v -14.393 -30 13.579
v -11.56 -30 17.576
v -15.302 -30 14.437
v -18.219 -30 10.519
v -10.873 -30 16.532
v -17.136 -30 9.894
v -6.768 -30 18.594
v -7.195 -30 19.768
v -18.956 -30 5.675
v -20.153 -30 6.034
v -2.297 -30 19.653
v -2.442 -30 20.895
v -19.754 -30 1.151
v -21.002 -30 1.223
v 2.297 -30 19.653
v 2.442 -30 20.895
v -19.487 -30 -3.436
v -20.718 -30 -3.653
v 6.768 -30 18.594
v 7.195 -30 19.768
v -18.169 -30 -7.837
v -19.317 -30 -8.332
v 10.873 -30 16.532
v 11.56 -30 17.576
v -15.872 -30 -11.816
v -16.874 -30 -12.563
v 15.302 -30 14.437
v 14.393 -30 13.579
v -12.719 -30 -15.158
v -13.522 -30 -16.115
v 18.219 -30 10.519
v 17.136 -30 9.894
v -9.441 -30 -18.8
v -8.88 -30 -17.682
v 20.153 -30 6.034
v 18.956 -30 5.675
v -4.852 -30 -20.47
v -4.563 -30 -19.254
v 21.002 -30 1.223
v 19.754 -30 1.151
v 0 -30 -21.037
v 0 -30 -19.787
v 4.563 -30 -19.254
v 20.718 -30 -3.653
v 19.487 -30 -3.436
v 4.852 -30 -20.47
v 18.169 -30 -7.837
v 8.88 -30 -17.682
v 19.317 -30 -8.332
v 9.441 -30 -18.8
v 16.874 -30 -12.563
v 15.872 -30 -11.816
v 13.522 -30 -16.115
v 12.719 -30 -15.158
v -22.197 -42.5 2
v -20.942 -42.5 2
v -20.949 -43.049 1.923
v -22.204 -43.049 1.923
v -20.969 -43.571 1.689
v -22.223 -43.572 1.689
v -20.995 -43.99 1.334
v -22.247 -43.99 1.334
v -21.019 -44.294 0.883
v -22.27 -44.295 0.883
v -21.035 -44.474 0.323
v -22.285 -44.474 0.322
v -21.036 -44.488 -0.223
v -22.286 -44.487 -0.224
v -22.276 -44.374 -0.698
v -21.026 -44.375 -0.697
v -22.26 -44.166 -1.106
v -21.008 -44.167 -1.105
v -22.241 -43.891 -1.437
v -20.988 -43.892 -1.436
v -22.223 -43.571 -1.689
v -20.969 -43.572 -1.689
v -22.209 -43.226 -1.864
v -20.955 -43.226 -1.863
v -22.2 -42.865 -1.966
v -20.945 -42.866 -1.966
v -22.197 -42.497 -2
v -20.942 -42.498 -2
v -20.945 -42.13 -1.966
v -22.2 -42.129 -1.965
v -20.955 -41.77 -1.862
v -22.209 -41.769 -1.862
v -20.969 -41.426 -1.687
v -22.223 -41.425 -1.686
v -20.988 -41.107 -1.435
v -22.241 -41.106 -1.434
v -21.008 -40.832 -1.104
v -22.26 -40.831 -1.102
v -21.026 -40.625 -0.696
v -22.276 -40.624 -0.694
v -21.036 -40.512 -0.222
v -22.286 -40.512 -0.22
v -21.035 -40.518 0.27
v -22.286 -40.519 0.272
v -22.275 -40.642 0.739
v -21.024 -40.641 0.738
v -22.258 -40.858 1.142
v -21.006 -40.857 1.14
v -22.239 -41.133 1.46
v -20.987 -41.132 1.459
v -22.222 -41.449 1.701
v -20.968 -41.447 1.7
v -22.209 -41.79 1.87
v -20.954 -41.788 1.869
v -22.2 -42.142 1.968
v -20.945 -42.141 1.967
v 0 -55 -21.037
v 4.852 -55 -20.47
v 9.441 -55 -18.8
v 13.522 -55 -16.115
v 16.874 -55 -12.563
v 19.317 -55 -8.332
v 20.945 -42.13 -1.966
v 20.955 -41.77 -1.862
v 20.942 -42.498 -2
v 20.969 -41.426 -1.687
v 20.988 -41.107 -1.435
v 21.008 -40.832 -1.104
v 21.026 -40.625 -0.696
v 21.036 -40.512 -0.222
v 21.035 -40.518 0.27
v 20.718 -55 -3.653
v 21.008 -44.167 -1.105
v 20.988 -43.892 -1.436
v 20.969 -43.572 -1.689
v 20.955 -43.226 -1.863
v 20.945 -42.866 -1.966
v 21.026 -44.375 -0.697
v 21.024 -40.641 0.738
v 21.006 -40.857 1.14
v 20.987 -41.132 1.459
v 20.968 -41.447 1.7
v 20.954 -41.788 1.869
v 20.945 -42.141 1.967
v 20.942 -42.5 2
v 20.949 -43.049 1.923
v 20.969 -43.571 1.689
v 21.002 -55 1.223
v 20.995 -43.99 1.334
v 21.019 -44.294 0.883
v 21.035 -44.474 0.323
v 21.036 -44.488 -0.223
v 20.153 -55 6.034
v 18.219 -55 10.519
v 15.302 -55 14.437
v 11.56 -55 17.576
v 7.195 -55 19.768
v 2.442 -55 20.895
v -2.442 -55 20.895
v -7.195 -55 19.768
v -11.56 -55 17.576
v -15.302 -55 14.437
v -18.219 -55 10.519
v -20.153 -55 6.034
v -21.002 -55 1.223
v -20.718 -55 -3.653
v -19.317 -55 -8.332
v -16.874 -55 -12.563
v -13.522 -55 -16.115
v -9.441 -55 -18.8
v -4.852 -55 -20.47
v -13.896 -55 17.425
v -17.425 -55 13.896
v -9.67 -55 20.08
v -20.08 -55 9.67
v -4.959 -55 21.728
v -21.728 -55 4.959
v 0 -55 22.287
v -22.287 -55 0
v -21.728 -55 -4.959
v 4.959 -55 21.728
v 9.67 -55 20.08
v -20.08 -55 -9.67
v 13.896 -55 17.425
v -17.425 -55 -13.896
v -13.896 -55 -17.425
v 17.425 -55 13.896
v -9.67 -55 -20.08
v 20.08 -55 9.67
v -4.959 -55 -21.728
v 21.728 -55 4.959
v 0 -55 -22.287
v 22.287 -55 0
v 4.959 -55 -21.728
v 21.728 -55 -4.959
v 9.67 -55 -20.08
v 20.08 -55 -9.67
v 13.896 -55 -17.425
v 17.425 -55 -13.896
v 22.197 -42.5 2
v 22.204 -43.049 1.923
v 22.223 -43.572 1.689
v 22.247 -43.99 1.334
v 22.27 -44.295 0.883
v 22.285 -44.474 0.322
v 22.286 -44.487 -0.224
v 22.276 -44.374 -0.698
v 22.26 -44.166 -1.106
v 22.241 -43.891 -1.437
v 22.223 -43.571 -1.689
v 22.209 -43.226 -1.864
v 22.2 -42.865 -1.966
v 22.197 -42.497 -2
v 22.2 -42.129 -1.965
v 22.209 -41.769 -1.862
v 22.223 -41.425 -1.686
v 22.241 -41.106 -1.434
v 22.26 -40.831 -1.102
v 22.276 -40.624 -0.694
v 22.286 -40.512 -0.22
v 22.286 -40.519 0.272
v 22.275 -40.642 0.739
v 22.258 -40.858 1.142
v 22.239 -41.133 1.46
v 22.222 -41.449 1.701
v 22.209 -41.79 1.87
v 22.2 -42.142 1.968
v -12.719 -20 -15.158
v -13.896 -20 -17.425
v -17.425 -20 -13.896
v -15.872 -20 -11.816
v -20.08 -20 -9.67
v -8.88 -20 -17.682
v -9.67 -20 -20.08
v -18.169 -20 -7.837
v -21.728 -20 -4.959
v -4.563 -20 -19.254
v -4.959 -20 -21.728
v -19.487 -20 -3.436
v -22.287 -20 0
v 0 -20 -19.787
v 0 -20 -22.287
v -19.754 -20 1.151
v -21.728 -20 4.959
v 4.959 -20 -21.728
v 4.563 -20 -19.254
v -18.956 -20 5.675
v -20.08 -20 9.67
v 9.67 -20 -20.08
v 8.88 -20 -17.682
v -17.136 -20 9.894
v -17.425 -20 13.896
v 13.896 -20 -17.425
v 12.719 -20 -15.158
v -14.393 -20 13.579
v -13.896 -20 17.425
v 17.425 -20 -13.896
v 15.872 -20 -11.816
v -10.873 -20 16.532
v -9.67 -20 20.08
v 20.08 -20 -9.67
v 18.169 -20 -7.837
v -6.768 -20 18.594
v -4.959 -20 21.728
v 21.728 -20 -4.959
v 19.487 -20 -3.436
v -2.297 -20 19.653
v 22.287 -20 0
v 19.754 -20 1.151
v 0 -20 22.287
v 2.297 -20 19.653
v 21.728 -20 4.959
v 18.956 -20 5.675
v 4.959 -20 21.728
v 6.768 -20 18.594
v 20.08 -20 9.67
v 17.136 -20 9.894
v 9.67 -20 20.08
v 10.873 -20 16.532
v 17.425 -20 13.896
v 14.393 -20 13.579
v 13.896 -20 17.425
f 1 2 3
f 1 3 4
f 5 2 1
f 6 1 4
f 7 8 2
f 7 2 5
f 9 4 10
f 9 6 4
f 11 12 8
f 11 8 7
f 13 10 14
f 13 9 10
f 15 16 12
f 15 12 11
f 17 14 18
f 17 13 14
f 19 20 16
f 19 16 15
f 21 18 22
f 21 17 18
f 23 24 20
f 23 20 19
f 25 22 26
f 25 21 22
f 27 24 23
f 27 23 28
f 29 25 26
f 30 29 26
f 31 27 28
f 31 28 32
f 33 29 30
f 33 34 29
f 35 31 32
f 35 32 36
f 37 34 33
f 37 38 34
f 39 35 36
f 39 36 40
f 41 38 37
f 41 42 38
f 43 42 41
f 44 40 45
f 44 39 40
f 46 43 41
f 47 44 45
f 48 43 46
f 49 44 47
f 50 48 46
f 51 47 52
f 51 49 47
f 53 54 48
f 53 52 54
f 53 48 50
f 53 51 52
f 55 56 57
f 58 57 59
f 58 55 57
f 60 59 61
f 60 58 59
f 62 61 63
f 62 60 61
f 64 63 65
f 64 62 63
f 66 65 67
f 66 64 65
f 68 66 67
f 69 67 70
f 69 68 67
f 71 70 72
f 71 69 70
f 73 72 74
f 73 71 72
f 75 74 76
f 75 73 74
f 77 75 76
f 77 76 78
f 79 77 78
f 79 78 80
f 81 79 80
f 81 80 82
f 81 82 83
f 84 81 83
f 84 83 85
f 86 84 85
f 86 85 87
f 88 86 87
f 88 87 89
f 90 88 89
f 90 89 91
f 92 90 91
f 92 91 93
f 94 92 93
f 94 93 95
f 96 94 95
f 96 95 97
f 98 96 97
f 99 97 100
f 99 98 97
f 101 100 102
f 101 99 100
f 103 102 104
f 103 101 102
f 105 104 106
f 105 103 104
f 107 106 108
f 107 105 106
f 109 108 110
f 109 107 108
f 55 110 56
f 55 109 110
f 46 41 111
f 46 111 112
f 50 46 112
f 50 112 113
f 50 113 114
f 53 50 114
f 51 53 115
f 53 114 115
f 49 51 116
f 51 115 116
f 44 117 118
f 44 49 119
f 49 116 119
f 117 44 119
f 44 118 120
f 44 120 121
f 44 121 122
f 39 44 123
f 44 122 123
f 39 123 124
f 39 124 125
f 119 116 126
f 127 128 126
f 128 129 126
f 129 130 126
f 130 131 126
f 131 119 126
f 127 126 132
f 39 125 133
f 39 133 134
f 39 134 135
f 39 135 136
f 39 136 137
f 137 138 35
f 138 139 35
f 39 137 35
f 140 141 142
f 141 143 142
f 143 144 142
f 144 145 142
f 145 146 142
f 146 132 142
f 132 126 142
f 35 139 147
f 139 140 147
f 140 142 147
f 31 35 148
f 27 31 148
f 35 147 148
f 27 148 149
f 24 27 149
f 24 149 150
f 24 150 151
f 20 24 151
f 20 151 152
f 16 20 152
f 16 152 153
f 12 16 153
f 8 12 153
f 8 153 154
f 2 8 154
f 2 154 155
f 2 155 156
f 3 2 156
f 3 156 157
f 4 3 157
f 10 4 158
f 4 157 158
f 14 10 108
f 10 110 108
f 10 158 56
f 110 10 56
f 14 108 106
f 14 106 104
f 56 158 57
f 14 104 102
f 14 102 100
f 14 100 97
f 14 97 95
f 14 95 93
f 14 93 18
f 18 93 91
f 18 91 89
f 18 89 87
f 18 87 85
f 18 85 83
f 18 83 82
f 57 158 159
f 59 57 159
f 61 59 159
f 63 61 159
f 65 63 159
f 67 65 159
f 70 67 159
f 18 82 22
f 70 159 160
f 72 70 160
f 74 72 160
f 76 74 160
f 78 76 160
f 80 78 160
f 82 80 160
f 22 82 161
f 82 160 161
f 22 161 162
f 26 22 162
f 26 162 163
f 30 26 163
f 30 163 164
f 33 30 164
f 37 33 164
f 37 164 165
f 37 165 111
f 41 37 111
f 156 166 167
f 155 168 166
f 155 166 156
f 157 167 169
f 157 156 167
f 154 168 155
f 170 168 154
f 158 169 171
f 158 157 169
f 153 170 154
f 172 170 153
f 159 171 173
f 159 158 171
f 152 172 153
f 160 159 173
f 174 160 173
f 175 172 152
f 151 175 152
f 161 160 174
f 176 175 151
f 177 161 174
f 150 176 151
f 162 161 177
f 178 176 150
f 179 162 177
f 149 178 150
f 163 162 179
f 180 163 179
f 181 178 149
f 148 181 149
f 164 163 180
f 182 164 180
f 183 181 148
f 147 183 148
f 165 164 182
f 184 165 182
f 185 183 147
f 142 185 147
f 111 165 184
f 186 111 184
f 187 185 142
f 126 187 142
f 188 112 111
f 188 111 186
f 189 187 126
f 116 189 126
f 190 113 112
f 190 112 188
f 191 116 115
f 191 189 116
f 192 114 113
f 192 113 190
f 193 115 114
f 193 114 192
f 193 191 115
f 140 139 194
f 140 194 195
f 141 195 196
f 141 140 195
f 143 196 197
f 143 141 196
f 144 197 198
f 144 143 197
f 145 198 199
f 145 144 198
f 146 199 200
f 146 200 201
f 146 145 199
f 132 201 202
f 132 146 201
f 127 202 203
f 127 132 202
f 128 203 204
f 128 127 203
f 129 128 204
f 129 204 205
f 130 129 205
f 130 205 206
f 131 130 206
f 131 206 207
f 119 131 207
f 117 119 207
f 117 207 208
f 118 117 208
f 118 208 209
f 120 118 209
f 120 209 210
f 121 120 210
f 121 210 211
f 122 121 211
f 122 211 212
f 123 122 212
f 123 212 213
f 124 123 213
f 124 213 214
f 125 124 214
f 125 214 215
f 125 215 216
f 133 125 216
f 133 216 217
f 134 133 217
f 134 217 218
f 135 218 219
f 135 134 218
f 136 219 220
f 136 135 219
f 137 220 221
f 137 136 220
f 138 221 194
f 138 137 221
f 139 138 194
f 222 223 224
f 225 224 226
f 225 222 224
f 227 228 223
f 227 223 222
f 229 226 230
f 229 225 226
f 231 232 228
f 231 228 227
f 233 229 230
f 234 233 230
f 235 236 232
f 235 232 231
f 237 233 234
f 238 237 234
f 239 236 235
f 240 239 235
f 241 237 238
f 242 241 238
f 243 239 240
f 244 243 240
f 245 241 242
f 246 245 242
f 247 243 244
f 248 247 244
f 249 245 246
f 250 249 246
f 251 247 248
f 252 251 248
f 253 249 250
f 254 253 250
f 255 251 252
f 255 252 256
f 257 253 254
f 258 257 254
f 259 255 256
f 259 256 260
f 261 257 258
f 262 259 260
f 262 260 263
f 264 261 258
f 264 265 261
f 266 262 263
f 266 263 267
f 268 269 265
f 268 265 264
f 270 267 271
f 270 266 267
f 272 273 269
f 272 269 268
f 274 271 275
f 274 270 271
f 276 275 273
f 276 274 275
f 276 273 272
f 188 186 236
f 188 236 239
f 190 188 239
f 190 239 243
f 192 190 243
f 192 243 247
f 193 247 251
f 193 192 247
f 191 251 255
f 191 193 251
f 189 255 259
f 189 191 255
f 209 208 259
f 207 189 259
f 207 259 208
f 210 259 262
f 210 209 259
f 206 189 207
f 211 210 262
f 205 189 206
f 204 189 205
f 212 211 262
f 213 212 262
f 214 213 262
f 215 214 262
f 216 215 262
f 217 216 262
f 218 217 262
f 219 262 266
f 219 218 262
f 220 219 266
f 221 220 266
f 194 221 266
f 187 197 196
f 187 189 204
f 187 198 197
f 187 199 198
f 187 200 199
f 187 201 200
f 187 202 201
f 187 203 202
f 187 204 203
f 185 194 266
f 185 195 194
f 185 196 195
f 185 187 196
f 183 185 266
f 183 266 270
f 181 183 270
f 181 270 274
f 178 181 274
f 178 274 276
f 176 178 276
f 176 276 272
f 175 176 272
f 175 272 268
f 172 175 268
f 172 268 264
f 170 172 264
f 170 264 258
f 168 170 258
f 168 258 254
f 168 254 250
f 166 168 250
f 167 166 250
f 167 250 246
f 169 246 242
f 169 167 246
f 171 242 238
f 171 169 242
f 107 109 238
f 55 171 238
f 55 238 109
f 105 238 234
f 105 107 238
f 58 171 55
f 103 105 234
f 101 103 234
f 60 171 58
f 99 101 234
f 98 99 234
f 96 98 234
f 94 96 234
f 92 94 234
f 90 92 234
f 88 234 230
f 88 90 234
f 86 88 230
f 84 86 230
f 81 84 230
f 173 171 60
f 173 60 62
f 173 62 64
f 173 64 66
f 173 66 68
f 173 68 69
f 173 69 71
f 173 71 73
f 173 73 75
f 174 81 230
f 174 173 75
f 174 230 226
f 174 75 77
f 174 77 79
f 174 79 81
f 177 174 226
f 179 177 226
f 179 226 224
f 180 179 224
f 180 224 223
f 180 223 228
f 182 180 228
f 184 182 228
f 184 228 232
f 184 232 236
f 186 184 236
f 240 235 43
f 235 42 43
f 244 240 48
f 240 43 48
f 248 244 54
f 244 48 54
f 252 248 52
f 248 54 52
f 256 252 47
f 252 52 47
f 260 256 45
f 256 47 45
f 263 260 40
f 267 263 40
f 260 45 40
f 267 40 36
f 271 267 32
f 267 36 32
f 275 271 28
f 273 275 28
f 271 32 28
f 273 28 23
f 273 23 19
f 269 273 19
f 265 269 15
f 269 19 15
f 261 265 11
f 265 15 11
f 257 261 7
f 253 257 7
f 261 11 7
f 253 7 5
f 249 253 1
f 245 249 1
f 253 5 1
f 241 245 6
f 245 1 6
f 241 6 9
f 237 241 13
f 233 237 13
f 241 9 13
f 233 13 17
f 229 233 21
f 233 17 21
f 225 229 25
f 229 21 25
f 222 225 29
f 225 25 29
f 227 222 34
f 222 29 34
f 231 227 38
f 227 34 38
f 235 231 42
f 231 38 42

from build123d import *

# Parameters (mm, degrees)
SKETCH1_R                = 34
BOSS_EXTRUDE1_DEPTH      = 10
SKETCH2_R                = 19.7871926
SKETCH2_R_2              = 2
CUT_EXTRUDE1_DEPTH       = 10
SKETCH3_R                = 4.837531333
SKETCH4_W                = 4.837531333
SKETCH4_H                = 4.837531333
CUT_EXTRUDE3_DEPTH       = 38
CUT_EXTRUDE3_DEPTH_BACK  = 38
SKETCH5_W                = 72.361656805
SKETCH5_H                = 8.896778435
BOSS_EXTRUDE2_START      = 60
SKETCH6_R                = 22.2871926
SKETCH6_R_2              = 19.7871926
BOSS_EXTRUDE2_DEPTH      = 60
SKETCH7_R                = 21.0371926
SKETCH7_R_2              = 19.7871926
CUT_EXTRUDE4_DEPTH       = 25
CUT_EXTRUDE6_DEPTH       = 25
CUT_EXTRUDE6_DEPTH_BACK  = 25
SKETCH8_R                = 2
CUT_EXTRUDE7_DEPTH       = 43
CUT_EXTRUDE7_DEPTH_BACK  = 53
SKETCH9_W                = 69.351432881
SKETCH9_H                = 5.737807944
CUT_EXTRUDE8_START       = -25
SKETCH10_R               = 22.2871926
SKETCH10_R_2             = 21.0371926
CUT_EXTRUDE8_DEPTH       = 25
CUT_EXTRUDE9_DEPTH       = 30
CUT_EXTRUDE9_DEPTH_BACK  = 30
SKETCH11_R               = 2
CUT_EXTRUDE10_DEPTH      = 53
CUT_EXTRUDE10_DEPTH_BACK = 26
SKETCH12_W               = 42.0743852
SKETCH12_H               = 25


with BuildPart() as part:
    # Sketch1 → Boss-Extrude1 (new body)
    with BuildSketch(Plane(origin=(0, 0, 0), x_dir=(1, 0, 0), z_dir=(0, 1, 0))):
        Circle(SKETCH1_R)
    extrude(amount=BOSS_EXTRUDE1_DEPTH)

    # Sketch2 → Cut-Extrude1 (cut)
    with BuildSketch(Plane.XZ):
        Circle(SKETCH2_R)
        with Locations((-22.1, 12.5)):
            Circle(SKETCH2_R_2)
        with Locations((22.1, 12.5)):
            Circle(SKETCH2_R_2)
        with Locations((22.1, -12.5)):
            Circle(SKETCH2_R_2)
        with Locations((-22.1, -12.5)):
            Circle(SKETCH2_R_2)
    extrude(amount=-CUT_EXTRUDE1_DEPTH, mode=Mode.SUBTRACT)

    # Sketch3 → Cut-Revolve1 (revolve, cut)
    with BuildSketch(Plane(origin=(0, 0, 0), x_dir=(0, 0, -1), z_dir=(1, 0, 0))):
        with Locations((-34, 5)):
            Circle(SKETCH3_R)
    revolve(axis=Axis((0, 0, 0), (0, 1, 0)), mode=Mode.SUBTRACT)

    # Sketch4 → Cut-Revolve2 (revolve, cut)
    with BuildSketch(Plane(origin=(0, 0, 0), x_dir=(0, 0, -1), z_dir=(1, 0, 0))):
        with Locations((-31.581234333, 2.581234333)):
            Rectangle(SKETCH4_W, SKETCH4_H)
    revolve(axis=Axis((0, 0, 0), (0, 1, 0)), mode=Mode.SUBTRACT)

    # Sketch5 → Cut-Extrude3 (cut, two sides: drawn at the far end of the back side and taken through both)
    with BuildSketch(Plane(origin=(0, 0, 0), x_dir=(0, 0, -1), z_dir=(1, 0, 0)).offset(-CUT_EXTRUDE3_DEPTH_BACK)):
        with Locations((-0.901301775, 0.551610782)):
            Rectangle(SKETCH5_W, SKETCH5_H)
    extrude(amount=CUT_EXTRUDE3_DEPTH + CUT_EXTRUDE3_DEPTH_BACK, mode=Mode.SUBTRACT)

    # Sketch6 → Boss-Extrude2 (add)
    with BuildSketch(Plane.XZ.offset(-5).offset(BOSS_EXTRUDE2_START)):
        Circle(SKETCH6_R)
        Circle(SKETCH6_R_2, mode=Mode.SUBTRACT)
    extrude(amount=-BOSS_EXTRUDE2_DEPTH)

    # Sketch7 → Cut-Extrude4 (cut)
    with BuildSketch(Plane.XZ.offset(55)):
        Circle(SKETCH7_R)
        Circle(SKETCH7_R_2, mode=Mode.SUBTRACT)
    extrude(amount=-CUT_EXTRUDE4_DEPTH, mode=Mode.SUBTRACT)

    # Sketch8 → Cut-Extrude6 (cut, two sides: drawn at the far end of the back side and taken through both)
    with BuildSketch(Plane(origin=(0, 0, 0), x_dir=(0, 0, -1), z_dir=(1, 0, 0)).offset(-CUT_EXTRUDE6_DEPTH_BACK)):
        with Locations((0, -42.5)):
            Circle(SKETCH8_R)
    extrude(amount=CUT_EXTRUDE6_DEPTH + CUT_EXTRUDE6_DEPTH_BACK, mode=Mode.SUBTRACT)

    # Sketch9 → Cut-Extrude7 (cut, two sides: drawn at the far end of the back side and taken through both)
    with BuildSketch(Plane(origin=(0, 0, 0), x_dir=(0, 0, -1), z_dir=(1, 0, 0)).offset(-CUT_EXTRUDE7_DEPTH_BACK)):
        with Locations((0.165912519, 7.868903972)):
            Rectangle(SKETCH9_W, SKETCH9_H)
    extrude(amount=CUT_EXTRUDE7_DEPTH + CUT_EXTRUDE7_DEPTH_BACK, mode=Mode.SUBTRACT)

    # Sketch10 → Cut-Extrude8 (cut)
    with BuildSketch(Plane(origin=(0, 5, 0), x_dir=(1, 0, 0), z_dir=(0, 1, 0)).offset(CUT_EXTRUDE8_START)):
        Circle(SKETCH10_R)
        Circle(SKETCH10_R_2, mode=Mode.SUBTRACT)
    extrude(amount=CUT_EXTRUDE8_DEPTH, mode=Mode.SUBTRACT)

    # Sketch11 → Cut-Extrude9 (cut, two sides: drawn at the far end of the back side and taken through both)
    with BuildSketch(Plane(origin=(0, 0, 0), x_dir=(0, 0, -1), z_dir=(1, 0, 0)).offset(-CUT_EXTRUDE9_DEPTH_BACK)):
        with Locations((0, -7.5)):
            Circle(SKETCH11_R)
    extrude(amount=CUT_EXTRUDE9_DEPTH + CUT_EXTRUDE9_DEPTH_BACK, mode=Mode.SUBTRACT)

    # Sketch12 → Cut-Extrude10 (cut, two sides: drawn at the far end of the back side and taken through both)
    with BuildSketch(Plane.XY.offset(-CUT_EXTRUDE10_DEPTH_BACK)):
        with Locations((0, -7.5)):
            Rectangle(SKETCH12_W, SKETCH12_H)
    extrude(amount=CUT_EXTRUDE10_DEPTH + CUT_EXTRUDE10_DEPTH_BACK, mode=Mode.SUBTRACT)


solid = part.part
